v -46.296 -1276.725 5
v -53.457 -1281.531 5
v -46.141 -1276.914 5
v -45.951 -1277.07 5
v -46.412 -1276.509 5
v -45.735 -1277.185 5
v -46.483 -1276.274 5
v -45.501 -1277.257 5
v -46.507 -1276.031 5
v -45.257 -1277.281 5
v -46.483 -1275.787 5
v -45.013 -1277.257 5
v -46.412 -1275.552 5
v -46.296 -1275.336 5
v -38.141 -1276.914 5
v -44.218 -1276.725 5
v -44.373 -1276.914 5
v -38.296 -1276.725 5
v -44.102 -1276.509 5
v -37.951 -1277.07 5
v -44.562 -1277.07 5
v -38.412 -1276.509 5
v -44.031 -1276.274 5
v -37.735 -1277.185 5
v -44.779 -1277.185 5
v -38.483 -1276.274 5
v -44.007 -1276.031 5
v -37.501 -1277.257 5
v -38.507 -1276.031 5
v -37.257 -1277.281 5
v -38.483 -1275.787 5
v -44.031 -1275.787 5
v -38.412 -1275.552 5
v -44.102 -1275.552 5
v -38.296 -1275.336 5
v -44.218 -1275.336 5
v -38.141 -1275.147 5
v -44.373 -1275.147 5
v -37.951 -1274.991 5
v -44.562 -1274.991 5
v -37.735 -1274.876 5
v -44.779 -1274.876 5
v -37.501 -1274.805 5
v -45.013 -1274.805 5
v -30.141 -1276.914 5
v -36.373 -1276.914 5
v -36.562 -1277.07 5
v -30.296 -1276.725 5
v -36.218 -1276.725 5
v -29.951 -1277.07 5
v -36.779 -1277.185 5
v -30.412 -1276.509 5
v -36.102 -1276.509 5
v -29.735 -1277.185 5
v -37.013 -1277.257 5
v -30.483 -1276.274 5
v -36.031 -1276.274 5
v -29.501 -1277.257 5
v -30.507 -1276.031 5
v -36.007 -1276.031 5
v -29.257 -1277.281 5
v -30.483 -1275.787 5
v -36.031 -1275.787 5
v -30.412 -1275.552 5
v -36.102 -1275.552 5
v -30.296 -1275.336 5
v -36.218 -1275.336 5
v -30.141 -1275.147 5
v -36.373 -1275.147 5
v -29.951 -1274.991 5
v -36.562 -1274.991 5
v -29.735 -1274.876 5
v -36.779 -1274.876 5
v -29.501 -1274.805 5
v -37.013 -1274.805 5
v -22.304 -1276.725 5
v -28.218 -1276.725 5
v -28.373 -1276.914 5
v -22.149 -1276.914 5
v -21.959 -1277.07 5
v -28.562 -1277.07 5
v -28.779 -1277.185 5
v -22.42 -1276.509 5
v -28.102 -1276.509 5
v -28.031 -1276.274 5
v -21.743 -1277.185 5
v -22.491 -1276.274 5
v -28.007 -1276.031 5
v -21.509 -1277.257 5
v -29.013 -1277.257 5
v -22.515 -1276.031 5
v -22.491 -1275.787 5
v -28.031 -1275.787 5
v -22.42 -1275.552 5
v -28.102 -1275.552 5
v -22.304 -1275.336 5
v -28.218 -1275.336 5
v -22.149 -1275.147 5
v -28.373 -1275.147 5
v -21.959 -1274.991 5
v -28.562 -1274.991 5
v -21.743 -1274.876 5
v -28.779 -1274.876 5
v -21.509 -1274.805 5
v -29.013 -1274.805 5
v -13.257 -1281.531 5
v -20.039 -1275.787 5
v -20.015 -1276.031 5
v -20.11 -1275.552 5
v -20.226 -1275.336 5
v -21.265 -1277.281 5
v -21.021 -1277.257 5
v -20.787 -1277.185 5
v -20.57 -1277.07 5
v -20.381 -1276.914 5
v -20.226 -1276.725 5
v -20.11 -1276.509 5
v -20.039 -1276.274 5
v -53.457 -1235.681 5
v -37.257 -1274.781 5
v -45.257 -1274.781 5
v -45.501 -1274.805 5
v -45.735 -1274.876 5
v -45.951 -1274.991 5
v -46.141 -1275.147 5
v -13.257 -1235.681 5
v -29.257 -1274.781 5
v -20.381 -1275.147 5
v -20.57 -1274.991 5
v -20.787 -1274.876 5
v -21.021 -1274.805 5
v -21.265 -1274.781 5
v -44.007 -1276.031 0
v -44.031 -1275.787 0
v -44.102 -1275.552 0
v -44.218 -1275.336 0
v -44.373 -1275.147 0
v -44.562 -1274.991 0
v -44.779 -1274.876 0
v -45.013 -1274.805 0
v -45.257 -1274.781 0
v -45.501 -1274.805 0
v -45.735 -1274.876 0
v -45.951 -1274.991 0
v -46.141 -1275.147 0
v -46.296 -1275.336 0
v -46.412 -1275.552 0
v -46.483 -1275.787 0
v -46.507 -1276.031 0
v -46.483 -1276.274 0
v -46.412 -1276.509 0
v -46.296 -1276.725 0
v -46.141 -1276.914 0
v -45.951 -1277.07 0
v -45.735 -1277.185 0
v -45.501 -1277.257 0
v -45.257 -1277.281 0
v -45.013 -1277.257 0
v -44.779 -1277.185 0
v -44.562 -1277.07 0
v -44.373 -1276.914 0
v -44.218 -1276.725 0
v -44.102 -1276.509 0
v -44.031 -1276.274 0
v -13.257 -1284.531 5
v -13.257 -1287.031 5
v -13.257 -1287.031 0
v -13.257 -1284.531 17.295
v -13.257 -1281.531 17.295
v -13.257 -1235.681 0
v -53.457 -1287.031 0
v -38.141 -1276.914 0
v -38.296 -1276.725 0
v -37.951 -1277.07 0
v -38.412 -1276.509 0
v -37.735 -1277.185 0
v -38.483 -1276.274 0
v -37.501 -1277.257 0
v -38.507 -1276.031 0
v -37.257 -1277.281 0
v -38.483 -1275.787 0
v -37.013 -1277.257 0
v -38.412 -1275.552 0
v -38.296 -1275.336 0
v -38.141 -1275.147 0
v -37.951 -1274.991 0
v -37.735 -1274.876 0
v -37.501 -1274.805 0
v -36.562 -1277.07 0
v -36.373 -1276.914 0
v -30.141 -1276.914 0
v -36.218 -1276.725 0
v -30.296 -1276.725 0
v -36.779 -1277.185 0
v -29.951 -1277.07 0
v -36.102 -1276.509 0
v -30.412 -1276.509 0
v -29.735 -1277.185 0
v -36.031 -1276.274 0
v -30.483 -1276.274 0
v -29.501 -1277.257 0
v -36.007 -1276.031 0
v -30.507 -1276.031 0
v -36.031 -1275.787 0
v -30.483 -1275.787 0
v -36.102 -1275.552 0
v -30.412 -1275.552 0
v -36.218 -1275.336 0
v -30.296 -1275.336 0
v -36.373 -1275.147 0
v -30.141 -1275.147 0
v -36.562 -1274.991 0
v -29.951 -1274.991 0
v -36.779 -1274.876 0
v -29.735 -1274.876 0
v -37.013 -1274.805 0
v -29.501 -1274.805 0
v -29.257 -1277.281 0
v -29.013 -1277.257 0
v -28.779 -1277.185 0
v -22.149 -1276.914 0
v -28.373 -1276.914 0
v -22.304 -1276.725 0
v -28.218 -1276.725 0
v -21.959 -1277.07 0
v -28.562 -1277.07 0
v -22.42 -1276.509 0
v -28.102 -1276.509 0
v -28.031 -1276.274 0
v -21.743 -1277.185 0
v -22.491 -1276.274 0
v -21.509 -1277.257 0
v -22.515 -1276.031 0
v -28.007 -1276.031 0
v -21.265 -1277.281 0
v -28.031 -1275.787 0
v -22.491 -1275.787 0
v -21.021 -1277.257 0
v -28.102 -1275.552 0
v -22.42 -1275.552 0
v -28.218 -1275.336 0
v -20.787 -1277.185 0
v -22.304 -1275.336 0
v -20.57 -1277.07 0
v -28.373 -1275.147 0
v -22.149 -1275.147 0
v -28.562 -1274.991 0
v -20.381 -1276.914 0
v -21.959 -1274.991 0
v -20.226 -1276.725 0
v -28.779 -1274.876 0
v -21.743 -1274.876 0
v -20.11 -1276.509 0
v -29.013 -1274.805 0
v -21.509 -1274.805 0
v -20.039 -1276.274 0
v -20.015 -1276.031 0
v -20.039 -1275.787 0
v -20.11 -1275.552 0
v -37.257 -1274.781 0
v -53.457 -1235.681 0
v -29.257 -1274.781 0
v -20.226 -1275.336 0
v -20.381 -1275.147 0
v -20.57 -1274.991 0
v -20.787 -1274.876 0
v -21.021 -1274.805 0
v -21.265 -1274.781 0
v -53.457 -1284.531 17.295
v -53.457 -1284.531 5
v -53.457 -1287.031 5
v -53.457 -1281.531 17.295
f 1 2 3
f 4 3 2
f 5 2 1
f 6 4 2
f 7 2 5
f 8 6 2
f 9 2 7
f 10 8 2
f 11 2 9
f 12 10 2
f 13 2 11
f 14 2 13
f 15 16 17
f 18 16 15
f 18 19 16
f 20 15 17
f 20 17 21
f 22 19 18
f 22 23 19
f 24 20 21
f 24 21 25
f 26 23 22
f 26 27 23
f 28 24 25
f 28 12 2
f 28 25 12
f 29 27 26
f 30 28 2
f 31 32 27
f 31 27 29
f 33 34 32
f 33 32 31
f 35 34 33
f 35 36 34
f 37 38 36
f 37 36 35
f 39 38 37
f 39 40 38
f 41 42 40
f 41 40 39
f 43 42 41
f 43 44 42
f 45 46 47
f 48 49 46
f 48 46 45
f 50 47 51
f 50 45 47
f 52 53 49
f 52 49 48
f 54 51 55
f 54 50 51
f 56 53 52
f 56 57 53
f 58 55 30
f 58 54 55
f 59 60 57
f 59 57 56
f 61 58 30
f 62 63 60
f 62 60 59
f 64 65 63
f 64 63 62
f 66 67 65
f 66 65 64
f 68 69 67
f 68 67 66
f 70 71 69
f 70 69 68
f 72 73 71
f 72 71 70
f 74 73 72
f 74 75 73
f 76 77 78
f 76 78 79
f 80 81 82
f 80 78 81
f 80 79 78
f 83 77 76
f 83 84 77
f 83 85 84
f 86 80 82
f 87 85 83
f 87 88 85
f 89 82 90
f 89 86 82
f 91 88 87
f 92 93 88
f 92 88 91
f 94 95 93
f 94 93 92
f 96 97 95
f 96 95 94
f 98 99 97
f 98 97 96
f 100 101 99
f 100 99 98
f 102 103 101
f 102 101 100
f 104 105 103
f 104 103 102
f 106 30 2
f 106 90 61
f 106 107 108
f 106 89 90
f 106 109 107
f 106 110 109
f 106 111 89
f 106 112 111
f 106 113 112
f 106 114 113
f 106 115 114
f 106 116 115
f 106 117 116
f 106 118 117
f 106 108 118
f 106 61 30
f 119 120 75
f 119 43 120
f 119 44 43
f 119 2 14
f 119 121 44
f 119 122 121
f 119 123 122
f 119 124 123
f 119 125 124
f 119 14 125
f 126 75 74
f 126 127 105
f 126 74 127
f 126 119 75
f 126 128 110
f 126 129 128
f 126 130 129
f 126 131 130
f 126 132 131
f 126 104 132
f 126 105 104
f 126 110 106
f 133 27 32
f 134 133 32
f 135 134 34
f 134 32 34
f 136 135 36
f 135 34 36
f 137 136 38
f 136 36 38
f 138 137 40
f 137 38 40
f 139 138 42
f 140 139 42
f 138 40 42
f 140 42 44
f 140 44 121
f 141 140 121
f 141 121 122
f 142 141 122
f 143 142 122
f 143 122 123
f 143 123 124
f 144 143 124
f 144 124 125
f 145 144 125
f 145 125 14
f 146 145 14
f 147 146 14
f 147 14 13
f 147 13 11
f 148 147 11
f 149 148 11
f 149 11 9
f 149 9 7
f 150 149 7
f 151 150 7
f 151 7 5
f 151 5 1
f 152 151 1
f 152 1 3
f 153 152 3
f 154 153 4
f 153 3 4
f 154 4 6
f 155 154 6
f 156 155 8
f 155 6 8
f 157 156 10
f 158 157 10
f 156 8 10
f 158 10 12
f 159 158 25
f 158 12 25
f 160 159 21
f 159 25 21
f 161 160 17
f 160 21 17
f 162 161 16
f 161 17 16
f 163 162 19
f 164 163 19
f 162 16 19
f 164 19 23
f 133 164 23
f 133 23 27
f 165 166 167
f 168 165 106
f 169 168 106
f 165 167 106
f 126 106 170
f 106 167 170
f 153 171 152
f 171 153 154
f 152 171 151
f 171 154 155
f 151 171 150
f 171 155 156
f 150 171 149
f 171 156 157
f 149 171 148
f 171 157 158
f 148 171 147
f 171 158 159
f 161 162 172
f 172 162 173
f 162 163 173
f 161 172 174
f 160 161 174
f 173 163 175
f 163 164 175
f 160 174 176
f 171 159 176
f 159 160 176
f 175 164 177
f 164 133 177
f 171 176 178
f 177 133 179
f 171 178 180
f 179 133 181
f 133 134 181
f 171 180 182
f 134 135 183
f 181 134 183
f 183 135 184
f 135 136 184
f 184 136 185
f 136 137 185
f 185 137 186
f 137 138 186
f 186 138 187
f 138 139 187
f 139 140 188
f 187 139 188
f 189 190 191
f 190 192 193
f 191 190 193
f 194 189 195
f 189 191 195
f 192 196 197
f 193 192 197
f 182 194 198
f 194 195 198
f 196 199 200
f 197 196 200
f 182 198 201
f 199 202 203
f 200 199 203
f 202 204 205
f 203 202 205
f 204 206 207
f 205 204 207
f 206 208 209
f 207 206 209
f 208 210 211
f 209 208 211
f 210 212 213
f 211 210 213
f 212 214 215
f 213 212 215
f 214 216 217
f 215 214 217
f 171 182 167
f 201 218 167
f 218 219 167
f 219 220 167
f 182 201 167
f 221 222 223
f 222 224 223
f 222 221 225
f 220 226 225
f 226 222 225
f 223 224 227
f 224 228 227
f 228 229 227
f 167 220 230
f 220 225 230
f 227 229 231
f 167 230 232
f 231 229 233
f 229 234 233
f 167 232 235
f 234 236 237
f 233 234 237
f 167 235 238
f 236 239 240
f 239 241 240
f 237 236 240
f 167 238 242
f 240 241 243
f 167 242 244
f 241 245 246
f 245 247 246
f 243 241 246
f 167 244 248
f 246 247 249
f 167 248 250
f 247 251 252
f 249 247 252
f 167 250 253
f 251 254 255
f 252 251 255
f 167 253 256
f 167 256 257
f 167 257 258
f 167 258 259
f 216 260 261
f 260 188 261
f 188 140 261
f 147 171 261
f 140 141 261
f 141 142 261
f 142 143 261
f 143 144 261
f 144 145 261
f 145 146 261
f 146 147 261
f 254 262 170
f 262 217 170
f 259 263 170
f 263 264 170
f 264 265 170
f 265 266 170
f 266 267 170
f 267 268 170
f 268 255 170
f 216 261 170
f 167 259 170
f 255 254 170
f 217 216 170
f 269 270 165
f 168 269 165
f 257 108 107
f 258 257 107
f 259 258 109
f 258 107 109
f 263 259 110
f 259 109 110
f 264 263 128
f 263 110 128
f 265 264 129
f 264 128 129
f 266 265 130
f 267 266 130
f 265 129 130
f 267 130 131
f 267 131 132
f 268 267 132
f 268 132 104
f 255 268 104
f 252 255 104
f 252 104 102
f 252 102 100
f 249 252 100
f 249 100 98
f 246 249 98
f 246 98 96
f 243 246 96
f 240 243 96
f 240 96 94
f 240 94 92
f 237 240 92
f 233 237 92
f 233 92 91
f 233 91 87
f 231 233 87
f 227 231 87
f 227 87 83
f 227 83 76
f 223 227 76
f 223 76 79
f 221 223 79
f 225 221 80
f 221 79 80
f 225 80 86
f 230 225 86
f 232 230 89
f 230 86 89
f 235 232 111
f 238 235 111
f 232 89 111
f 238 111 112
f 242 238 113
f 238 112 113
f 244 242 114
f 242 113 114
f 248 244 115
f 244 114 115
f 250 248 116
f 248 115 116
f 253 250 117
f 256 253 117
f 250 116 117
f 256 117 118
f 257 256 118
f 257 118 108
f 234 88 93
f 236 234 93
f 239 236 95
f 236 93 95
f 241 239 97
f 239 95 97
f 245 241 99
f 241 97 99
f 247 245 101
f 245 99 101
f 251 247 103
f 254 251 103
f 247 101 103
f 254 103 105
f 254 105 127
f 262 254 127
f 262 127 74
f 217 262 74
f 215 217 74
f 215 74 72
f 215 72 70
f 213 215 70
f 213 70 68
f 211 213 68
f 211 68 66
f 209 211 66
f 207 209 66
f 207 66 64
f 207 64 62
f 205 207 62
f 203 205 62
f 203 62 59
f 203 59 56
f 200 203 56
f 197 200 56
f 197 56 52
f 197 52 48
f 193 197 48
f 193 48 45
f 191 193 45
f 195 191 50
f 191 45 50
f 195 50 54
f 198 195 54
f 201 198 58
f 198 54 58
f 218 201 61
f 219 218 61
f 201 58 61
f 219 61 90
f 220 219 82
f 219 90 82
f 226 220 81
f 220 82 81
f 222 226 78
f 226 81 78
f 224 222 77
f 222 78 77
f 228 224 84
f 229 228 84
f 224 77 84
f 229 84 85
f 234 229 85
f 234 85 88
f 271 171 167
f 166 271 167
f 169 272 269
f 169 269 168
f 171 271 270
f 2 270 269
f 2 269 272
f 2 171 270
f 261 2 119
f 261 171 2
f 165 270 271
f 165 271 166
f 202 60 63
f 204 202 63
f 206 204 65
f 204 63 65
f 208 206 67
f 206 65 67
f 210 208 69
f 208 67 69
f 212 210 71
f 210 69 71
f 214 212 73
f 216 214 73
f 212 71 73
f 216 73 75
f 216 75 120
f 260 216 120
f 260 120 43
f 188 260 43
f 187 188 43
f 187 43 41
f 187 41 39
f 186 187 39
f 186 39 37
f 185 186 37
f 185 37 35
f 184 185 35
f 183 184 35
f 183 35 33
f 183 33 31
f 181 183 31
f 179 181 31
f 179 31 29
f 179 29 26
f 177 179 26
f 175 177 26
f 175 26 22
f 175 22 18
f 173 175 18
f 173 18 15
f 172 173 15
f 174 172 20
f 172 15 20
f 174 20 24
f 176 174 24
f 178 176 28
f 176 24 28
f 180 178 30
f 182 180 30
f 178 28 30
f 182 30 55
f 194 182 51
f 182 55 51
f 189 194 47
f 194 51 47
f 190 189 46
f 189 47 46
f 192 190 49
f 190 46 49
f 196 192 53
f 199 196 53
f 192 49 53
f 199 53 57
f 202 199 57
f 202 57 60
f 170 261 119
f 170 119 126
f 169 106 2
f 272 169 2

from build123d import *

# Parameters (mm, degrees)
SKETCH1_W           = 40.2
SKETCH1_H           = 51.35
BOSS_EXTRUDE1_DEPTH = 5
BOSS_EXTRUDE2_DEPTH = 12.295
SKETCH4_R           = 1.249999996
SKETCH4_R_2         = 1.249999994
CUT_EXTRUDE1_DEPTH  = 10


with BuildPart() as part:
    # Sketch1 → Boss-Extrude1 (new body)
    with BuildSketch(Plane.XY):
        with Locations((-33.356876364, -1261.35554294)):
            Rectangle(SKETCH1_W, SKETCH1_H)
    extrude(amount=BOSS_EXTRUDE1_DEPTH)

    # Sketch2 → Boss-Extrude2 (add)
    with BuildSketch(Plane.XY.offset(5)):
        Polygon((-53.456876364, -1281.53054294), (-53.456876364, -1283.03054294), (-53.456876364, -1284.53054294), (-13.256876364, -1284.53054294), (-13.256876364, -1281.53054294), align=None)
    extrude(amount=BOSS_EXTRUDE2_DEPTH)

    # Sketch4 → Cut-Extrude1 (cut)
    with BuildSketch(Plane.XY.offset(5)):
        with Locations((-45.256876364, -1276.030542925)):
            Circle(SKETCH4_R)
        with Locations((-37.256876364, -1276.030542925)):
            Circle(SKETCH4_R_2)
        with Locations((-29.256876364, -1276.03054293)):
            Circle(SKETCH4_R)
        with Locations((-21.26485567, -1276.03054293)):
            Circle(SKETCH4_R)
    extrude(amount=-CUT_EXTRUDE1_DEPTH, mode=Mode.SUBTRACT)


solid = part.part
